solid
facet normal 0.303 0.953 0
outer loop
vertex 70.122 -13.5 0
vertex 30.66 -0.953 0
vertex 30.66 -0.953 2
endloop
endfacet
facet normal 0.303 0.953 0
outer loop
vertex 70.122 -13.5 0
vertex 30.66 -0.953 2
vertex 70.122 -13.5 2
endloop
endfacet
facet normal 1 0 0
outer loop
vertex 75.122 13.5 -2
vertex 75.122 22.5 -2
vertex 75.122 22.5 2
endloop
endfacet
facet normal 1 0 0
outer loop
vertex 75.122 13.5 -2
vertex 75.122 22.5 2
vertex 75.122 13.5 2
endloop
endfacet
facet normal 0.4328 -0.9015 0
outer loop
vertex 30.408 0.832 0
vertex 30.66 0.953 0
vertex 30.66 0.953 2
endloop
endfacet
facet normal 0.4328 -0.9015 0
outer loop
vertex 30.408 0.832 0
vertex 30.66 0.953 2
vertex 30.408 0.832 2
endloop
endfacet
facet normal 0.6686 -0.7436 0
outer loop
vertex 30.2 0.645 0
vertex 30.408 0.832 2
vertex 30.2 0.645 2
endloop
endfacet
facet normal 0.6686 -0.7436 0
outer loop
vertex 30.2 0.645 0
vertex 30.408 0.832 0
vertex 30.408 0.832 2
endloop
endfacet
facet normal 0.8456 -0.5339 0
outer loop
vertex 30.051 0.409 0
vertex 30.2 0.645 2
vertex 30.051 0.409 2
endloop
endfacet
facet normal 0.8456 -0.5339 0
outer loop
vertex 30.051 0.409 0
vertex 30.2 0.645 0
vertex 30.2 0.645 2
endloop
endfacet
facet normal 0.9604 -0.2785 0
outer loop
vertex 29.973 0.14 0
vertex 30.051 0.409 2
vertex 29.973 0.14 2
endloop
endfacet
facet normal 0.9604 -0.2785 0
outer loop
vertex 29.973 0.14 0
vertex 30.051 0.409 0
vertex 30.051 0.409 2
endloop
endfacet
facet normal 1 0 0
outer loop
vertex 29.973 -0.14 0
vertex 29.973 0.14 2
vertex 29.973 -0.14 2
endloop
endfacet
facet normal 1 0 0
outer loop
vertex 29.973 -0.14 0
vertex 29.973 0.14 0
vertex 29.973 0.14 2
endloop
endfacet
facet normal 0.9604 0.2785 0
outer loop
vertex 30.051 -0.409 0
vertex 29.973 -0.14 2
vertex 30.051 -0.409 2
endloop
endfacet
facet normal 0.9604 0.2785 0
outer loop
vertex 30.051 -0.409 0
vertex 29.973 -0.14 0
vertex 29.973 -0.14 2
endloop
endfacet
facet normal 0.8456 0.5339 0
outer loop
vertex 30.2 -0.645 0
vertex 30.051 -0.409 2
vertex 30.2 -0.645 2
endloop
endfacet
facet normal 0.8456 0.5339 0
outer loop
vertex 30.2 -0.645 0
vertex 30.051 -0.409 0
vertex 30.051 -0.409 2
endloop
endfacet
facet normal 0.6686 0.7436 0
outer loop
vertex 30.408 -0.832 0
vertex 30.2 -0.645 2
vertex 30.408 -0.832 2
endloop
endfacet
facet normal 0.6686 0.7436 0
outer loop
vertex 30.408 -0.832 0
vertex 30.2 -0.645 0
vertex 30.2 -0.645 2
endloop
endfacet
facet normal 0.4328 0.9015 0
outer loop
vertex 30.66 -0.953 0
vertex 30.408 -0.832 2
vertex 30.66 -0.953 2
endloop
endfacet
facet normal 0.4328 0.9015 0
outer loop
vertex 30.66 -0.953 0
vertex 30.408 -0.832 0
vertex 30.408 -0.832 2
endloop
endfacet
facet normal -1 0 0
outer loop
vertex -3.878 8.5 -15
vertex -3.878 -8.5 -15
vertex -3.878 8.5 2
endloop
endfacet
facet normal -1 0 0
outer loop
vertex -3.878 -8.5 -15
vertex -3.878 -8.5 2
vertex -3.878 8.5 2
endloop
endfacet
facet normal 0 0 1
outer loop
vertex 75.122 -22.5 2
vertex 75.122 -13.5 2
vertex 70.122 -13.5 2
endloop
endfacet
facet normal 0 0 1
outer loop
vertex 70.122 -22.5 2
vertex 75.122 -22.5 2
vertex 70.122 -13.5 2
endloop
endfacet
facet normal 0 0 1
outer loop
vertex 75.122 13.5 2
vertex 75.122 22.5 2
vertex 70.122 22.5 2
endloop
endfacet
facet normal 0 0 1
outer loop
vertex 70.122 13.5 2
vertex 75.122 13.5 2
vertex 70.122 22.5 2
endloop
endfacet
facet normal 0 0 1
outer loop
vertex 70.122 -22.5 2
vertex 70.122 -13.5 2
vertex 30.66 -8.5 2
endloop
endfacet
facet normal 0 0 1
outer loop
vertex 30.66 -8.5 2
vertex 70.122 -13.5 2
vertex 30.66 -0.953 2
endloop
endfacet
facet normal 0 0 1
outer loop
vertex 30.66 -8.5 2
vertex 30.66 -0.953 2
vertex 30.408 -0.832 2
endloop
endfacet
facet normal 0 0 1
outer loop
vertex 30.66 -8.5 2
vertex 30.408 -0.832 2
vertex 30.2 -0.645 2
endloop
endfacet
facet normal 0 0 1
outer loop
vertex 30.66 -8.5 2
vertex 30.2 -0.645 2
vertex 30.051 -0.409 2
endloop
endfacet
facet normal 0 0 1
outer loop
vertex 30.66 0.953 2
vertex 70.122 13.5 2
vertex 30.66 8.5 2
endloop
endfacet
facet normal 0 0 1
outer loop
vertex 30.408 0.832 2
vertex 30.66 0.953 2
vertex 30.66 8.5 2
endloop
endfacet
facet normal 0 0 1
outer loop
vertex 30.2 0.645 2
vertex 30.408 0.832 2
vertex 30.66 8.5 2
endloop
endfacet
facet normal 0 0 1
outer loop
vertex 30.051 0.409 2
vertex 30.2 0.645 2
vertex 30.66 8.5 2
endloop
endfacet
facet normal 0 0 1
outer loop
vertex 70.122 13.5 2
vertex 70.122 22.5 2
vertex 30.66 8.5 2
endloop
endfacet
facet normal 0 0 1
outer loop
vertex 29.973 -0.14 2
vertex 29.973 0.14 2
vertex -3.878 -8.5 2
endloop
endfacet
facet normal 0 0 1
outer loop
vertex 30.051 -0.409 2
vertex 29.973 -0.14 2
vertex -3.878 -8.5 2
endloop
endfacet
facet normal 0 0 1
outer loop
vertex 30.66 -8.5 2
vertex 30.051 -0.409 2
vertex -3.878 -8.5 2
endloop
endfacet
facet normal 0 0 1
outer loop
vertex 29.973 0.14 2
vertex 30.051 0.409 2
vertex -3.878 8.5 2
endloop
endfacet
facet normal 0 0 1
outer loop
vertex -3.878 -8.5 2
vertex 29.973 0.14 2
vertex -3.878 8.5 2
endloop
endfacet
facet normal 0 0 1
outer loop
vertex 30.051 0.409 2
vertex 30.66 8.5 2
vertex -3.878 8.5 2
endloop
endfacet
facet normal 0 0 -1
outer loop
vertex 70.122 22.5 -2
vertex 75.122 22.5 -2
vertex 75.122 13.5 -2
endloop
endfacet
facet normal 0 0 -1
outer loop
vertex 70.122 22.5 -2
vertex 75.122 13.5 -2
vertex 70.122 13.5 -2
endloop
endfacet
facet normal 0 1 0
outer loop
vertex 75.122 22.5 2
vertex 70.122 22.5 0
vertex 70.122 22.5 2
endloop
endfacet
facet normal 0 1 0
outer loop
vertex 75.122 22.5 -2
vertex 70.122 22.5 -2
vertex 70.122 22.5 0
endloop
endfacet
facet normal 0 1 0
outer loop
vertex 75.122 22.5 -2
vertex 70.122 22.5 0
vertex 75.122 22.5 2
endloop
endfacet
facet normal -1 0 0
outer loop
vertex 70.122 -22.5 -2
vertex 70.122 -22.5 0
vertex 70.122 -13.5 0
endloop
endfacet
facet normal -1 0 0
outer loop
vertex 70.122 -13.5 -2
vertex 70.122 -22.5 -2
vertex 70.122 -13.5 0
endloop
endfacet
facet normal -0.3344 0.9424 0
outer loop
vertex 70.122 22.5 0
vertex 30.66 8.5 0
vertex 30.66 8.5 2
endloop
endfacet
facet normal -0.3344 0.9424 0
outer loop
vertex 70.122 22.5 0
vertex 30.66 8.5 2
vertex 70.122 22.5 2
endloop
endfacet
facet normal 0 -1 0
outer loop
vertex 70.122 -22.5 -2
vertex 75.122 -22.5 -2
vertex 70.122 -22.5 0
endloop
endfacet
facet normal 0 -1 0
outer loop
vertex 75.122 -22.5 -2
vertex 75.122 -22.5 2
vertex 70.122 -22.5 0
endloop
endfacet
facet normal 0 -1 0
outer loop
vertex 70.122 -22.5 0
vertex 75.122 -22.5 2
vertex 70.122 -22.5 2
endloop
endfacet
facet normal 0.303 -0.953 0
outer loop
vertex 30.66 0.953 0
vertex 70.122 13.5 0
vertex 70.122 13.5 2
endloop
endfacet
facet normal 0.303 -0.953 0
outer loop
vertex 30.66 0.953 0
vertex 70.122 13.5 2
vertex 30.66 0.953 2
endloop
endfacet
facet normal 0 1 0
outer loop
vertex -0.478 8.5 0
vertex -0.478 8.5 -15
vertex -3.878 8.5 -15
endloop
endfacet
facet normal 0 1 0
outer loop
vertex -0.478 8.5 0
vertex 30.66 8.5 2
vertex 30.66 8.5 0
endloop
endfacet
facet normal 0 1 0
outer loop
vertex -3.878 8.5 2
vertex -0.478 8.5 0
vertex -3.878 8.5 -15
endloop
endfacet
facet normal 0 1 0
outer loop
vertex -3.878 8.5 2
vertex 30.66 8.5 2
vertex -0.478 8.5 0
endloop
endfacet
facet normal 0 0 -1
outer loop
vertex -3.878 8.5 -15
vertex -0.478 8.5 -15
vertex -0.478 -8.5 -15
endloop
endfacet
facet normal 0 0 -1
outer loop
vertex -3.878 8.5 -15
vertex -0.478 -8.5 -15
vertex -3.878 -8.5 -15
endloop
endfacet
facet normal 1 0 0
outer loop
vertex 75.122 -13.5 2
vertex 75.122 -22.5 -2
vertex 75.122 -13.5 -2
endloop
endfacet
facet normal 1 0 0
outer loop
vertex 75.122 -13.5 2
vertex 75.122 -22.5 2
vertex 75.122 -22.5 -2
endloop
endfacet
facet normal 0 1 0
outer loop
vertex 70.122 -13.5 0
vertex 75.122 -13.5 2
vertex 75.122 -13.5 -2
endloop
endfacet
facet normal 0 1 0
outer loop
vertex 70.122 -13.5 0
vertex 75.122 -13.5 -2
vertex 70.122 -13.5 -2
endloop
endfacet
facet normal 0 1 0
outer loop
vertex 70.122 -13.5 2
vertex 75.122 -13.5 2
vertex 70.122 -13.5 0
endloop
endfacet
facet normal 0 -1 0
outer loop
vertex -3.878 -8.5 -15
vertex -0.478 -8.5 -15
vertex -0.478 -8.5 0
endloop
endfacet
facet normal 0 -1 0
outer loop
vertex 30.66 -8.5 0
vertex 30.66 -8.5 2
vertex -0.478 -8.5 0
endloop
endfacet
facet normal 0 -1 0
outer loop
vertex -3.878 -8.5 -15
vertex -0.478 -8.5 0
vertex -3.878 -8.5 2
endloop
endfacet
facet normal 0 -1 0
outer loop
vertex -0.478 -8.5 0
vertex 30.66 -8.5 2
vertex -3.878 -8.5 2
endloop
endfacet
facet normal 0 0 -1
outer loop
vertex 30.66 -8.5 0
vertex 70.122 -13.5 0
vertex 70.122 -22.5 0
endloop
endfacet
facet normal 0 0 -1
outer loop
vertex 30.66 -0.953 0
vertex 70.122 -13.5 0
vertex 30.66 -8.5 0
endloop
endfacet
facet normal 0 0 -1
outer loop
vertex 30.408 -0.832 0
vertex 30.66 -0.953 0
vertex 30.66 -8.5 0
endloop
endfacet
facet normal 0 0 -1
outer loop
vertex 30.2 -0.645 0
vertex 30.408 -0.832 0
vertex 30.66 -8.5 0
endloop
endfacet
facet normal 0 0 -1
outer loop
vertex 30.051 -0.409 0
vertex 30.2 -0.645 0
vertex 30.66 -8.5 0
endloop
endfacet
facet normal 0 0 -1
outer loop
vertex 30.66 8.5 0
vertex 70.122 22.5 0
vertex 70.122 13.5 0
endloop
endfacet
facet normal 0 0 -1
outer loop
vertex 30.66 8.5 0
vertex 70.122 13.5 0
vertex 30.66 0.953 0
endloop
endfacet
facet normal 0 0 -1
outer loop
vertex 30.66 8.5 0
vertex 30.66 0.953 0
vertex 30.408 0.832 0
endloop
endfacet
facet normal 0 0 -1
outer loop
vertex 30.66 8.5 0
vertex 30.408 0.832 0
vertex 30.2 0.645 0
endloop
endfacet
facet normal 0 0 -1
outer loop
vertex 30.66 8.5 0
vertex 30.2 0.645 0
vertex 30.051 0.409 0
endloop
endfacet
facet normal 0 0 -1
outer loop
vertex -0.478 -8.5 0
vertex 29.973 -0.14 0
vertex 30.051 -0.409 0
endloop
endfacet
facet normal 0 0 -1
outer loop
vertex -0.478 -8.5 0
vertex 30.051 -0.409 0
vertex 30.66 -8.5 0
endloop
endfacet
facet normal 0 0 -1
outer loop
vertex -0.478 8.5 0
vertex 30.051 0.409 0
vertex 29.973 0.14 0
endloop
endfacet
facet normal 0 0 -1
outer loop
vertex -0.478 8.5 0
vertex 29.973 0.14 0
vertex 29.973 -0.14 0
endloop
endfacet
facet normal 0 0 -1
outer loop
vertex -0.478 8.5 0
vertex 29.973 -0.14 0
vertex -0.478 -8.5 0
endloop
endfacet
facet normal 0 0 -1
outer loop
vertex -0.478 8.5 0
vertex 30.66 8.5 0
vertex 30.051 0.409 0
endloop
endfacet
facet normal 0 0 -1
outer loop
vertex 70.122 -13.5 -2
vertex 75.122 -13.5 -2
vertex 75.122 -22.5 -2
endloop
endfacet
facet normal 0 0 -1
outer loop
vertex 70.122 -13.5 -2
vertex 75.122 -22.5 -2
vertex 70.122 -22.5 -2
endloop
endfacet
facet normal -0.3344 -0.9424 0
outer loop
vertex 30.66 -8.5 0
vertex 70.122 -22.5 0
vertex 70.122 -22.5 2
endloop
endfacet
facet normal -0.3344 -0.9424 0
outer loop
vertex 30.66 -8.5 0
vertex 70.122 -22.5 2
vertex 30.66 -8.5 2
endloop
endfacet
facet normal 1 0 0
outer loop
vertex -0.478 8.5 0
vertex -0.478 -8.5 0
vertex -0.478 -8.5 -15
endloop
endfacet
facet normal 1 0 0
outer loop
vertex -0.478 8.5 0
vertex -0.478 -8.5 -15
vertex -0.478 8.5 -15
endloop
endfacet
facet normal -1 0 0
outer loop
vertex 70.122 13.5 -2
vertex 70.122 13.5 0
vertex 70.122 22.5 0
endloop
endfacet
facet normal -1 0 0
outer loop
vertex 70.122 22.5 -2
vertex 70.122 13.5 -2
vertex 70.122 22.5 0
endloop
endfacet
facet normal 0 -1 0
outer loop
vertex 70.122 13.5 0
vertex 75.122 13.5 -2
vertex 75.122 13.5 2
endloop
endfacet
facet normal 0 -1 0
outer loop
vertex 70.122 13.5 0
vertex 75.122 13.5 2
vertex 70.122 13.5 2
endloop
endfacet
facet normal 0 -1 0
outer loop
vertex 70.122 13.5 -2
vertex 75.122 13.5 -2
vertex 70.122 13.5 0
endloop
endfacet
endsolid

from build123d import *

# Parameters (mm, degrees)
EXTRUDE_1_DEPTH = 2
SKETCH_3_W      = 3.4
SKETCH_3_H      = 17
EXTRUDE_2_DEPTH = 15
SKETCH_6_W      = 5
SKETCH_6_H      = 9
EXTRUDE_4_DEPTH = 2


with BuildPart() as part:
    # 스케치1 → 보스-돌출1 (new body)
    with BuildSketch(Plane.XY):
        with BuildLine():
            Line((30.660415516, 8.5), (70.121524493, 22.5))
            Line((70.121524493, 22.5), (75.121524493, 22.5))
            Line((75.121524493, 22.5), (75.121524493, 13.5))
            Line((75.121524493, 13.5), (70.121524493, 13.5))
            Line((70.121524493, 13.5), (30.660415516, 0.952987126))
            ThreePointArc((30.660415516, 0.952987126), (29.963426304, 0), (30.660415516, -0.952987126))
            Line((30.660415516, -0.952987126), (70.121524493, -13.5))
            Line((70.121524493, -13.5), (75.121524493, -13.5))
            Line((75.121524493, -13.5), (75.121524493, -22.5))
            Line((75.121524493, -22.5), (70.121524493, -22.5))
            Line((70.121524493, -22.5), (30.660415516, -8.5))
            Line((30.660415516, -8.5), (-3.878475507, -8.5))
            Line((-3.878475507, -8.5), (-3.878475507, 8.5))
            Line((-3.878475507, 8.5), (30.660415516, 8.5))
        make_face()
    extrude(amount=EXTRUDE_1_DEPTH)

    # 스케치3 → 보스-돌출2 (add)
    with BuildSketch(Plane(origin=(0, 0, 0), x_dir=(-1, 0, 0), z_dir=(0, 0, -1))):
        with Locations((2.178475507, 0)):
            Rectangle(SKETCH_3_W, SKETCH_3_H)
    extrude(amount=EXTRUDE_2_DEPTH)

    # 스케치6 → 보스-돌출4 (add)
    with BuildSketch(Plane(origin=(0, 0, 0), x_dir=(-1, 0, 0), z_dir=(0, 0, -1))):
        with Locations((-72.621524493, -18)):
            Rectangle(SKETCH_6_W, SKETCH_6_H)
        with Locations((-72.621524493, 18)):
            Rectangle(SKETCH_6_W, SKETCH_6_H)
    extrude(amount=EXTRUDE_4_DEPTH)


solid = part.part
